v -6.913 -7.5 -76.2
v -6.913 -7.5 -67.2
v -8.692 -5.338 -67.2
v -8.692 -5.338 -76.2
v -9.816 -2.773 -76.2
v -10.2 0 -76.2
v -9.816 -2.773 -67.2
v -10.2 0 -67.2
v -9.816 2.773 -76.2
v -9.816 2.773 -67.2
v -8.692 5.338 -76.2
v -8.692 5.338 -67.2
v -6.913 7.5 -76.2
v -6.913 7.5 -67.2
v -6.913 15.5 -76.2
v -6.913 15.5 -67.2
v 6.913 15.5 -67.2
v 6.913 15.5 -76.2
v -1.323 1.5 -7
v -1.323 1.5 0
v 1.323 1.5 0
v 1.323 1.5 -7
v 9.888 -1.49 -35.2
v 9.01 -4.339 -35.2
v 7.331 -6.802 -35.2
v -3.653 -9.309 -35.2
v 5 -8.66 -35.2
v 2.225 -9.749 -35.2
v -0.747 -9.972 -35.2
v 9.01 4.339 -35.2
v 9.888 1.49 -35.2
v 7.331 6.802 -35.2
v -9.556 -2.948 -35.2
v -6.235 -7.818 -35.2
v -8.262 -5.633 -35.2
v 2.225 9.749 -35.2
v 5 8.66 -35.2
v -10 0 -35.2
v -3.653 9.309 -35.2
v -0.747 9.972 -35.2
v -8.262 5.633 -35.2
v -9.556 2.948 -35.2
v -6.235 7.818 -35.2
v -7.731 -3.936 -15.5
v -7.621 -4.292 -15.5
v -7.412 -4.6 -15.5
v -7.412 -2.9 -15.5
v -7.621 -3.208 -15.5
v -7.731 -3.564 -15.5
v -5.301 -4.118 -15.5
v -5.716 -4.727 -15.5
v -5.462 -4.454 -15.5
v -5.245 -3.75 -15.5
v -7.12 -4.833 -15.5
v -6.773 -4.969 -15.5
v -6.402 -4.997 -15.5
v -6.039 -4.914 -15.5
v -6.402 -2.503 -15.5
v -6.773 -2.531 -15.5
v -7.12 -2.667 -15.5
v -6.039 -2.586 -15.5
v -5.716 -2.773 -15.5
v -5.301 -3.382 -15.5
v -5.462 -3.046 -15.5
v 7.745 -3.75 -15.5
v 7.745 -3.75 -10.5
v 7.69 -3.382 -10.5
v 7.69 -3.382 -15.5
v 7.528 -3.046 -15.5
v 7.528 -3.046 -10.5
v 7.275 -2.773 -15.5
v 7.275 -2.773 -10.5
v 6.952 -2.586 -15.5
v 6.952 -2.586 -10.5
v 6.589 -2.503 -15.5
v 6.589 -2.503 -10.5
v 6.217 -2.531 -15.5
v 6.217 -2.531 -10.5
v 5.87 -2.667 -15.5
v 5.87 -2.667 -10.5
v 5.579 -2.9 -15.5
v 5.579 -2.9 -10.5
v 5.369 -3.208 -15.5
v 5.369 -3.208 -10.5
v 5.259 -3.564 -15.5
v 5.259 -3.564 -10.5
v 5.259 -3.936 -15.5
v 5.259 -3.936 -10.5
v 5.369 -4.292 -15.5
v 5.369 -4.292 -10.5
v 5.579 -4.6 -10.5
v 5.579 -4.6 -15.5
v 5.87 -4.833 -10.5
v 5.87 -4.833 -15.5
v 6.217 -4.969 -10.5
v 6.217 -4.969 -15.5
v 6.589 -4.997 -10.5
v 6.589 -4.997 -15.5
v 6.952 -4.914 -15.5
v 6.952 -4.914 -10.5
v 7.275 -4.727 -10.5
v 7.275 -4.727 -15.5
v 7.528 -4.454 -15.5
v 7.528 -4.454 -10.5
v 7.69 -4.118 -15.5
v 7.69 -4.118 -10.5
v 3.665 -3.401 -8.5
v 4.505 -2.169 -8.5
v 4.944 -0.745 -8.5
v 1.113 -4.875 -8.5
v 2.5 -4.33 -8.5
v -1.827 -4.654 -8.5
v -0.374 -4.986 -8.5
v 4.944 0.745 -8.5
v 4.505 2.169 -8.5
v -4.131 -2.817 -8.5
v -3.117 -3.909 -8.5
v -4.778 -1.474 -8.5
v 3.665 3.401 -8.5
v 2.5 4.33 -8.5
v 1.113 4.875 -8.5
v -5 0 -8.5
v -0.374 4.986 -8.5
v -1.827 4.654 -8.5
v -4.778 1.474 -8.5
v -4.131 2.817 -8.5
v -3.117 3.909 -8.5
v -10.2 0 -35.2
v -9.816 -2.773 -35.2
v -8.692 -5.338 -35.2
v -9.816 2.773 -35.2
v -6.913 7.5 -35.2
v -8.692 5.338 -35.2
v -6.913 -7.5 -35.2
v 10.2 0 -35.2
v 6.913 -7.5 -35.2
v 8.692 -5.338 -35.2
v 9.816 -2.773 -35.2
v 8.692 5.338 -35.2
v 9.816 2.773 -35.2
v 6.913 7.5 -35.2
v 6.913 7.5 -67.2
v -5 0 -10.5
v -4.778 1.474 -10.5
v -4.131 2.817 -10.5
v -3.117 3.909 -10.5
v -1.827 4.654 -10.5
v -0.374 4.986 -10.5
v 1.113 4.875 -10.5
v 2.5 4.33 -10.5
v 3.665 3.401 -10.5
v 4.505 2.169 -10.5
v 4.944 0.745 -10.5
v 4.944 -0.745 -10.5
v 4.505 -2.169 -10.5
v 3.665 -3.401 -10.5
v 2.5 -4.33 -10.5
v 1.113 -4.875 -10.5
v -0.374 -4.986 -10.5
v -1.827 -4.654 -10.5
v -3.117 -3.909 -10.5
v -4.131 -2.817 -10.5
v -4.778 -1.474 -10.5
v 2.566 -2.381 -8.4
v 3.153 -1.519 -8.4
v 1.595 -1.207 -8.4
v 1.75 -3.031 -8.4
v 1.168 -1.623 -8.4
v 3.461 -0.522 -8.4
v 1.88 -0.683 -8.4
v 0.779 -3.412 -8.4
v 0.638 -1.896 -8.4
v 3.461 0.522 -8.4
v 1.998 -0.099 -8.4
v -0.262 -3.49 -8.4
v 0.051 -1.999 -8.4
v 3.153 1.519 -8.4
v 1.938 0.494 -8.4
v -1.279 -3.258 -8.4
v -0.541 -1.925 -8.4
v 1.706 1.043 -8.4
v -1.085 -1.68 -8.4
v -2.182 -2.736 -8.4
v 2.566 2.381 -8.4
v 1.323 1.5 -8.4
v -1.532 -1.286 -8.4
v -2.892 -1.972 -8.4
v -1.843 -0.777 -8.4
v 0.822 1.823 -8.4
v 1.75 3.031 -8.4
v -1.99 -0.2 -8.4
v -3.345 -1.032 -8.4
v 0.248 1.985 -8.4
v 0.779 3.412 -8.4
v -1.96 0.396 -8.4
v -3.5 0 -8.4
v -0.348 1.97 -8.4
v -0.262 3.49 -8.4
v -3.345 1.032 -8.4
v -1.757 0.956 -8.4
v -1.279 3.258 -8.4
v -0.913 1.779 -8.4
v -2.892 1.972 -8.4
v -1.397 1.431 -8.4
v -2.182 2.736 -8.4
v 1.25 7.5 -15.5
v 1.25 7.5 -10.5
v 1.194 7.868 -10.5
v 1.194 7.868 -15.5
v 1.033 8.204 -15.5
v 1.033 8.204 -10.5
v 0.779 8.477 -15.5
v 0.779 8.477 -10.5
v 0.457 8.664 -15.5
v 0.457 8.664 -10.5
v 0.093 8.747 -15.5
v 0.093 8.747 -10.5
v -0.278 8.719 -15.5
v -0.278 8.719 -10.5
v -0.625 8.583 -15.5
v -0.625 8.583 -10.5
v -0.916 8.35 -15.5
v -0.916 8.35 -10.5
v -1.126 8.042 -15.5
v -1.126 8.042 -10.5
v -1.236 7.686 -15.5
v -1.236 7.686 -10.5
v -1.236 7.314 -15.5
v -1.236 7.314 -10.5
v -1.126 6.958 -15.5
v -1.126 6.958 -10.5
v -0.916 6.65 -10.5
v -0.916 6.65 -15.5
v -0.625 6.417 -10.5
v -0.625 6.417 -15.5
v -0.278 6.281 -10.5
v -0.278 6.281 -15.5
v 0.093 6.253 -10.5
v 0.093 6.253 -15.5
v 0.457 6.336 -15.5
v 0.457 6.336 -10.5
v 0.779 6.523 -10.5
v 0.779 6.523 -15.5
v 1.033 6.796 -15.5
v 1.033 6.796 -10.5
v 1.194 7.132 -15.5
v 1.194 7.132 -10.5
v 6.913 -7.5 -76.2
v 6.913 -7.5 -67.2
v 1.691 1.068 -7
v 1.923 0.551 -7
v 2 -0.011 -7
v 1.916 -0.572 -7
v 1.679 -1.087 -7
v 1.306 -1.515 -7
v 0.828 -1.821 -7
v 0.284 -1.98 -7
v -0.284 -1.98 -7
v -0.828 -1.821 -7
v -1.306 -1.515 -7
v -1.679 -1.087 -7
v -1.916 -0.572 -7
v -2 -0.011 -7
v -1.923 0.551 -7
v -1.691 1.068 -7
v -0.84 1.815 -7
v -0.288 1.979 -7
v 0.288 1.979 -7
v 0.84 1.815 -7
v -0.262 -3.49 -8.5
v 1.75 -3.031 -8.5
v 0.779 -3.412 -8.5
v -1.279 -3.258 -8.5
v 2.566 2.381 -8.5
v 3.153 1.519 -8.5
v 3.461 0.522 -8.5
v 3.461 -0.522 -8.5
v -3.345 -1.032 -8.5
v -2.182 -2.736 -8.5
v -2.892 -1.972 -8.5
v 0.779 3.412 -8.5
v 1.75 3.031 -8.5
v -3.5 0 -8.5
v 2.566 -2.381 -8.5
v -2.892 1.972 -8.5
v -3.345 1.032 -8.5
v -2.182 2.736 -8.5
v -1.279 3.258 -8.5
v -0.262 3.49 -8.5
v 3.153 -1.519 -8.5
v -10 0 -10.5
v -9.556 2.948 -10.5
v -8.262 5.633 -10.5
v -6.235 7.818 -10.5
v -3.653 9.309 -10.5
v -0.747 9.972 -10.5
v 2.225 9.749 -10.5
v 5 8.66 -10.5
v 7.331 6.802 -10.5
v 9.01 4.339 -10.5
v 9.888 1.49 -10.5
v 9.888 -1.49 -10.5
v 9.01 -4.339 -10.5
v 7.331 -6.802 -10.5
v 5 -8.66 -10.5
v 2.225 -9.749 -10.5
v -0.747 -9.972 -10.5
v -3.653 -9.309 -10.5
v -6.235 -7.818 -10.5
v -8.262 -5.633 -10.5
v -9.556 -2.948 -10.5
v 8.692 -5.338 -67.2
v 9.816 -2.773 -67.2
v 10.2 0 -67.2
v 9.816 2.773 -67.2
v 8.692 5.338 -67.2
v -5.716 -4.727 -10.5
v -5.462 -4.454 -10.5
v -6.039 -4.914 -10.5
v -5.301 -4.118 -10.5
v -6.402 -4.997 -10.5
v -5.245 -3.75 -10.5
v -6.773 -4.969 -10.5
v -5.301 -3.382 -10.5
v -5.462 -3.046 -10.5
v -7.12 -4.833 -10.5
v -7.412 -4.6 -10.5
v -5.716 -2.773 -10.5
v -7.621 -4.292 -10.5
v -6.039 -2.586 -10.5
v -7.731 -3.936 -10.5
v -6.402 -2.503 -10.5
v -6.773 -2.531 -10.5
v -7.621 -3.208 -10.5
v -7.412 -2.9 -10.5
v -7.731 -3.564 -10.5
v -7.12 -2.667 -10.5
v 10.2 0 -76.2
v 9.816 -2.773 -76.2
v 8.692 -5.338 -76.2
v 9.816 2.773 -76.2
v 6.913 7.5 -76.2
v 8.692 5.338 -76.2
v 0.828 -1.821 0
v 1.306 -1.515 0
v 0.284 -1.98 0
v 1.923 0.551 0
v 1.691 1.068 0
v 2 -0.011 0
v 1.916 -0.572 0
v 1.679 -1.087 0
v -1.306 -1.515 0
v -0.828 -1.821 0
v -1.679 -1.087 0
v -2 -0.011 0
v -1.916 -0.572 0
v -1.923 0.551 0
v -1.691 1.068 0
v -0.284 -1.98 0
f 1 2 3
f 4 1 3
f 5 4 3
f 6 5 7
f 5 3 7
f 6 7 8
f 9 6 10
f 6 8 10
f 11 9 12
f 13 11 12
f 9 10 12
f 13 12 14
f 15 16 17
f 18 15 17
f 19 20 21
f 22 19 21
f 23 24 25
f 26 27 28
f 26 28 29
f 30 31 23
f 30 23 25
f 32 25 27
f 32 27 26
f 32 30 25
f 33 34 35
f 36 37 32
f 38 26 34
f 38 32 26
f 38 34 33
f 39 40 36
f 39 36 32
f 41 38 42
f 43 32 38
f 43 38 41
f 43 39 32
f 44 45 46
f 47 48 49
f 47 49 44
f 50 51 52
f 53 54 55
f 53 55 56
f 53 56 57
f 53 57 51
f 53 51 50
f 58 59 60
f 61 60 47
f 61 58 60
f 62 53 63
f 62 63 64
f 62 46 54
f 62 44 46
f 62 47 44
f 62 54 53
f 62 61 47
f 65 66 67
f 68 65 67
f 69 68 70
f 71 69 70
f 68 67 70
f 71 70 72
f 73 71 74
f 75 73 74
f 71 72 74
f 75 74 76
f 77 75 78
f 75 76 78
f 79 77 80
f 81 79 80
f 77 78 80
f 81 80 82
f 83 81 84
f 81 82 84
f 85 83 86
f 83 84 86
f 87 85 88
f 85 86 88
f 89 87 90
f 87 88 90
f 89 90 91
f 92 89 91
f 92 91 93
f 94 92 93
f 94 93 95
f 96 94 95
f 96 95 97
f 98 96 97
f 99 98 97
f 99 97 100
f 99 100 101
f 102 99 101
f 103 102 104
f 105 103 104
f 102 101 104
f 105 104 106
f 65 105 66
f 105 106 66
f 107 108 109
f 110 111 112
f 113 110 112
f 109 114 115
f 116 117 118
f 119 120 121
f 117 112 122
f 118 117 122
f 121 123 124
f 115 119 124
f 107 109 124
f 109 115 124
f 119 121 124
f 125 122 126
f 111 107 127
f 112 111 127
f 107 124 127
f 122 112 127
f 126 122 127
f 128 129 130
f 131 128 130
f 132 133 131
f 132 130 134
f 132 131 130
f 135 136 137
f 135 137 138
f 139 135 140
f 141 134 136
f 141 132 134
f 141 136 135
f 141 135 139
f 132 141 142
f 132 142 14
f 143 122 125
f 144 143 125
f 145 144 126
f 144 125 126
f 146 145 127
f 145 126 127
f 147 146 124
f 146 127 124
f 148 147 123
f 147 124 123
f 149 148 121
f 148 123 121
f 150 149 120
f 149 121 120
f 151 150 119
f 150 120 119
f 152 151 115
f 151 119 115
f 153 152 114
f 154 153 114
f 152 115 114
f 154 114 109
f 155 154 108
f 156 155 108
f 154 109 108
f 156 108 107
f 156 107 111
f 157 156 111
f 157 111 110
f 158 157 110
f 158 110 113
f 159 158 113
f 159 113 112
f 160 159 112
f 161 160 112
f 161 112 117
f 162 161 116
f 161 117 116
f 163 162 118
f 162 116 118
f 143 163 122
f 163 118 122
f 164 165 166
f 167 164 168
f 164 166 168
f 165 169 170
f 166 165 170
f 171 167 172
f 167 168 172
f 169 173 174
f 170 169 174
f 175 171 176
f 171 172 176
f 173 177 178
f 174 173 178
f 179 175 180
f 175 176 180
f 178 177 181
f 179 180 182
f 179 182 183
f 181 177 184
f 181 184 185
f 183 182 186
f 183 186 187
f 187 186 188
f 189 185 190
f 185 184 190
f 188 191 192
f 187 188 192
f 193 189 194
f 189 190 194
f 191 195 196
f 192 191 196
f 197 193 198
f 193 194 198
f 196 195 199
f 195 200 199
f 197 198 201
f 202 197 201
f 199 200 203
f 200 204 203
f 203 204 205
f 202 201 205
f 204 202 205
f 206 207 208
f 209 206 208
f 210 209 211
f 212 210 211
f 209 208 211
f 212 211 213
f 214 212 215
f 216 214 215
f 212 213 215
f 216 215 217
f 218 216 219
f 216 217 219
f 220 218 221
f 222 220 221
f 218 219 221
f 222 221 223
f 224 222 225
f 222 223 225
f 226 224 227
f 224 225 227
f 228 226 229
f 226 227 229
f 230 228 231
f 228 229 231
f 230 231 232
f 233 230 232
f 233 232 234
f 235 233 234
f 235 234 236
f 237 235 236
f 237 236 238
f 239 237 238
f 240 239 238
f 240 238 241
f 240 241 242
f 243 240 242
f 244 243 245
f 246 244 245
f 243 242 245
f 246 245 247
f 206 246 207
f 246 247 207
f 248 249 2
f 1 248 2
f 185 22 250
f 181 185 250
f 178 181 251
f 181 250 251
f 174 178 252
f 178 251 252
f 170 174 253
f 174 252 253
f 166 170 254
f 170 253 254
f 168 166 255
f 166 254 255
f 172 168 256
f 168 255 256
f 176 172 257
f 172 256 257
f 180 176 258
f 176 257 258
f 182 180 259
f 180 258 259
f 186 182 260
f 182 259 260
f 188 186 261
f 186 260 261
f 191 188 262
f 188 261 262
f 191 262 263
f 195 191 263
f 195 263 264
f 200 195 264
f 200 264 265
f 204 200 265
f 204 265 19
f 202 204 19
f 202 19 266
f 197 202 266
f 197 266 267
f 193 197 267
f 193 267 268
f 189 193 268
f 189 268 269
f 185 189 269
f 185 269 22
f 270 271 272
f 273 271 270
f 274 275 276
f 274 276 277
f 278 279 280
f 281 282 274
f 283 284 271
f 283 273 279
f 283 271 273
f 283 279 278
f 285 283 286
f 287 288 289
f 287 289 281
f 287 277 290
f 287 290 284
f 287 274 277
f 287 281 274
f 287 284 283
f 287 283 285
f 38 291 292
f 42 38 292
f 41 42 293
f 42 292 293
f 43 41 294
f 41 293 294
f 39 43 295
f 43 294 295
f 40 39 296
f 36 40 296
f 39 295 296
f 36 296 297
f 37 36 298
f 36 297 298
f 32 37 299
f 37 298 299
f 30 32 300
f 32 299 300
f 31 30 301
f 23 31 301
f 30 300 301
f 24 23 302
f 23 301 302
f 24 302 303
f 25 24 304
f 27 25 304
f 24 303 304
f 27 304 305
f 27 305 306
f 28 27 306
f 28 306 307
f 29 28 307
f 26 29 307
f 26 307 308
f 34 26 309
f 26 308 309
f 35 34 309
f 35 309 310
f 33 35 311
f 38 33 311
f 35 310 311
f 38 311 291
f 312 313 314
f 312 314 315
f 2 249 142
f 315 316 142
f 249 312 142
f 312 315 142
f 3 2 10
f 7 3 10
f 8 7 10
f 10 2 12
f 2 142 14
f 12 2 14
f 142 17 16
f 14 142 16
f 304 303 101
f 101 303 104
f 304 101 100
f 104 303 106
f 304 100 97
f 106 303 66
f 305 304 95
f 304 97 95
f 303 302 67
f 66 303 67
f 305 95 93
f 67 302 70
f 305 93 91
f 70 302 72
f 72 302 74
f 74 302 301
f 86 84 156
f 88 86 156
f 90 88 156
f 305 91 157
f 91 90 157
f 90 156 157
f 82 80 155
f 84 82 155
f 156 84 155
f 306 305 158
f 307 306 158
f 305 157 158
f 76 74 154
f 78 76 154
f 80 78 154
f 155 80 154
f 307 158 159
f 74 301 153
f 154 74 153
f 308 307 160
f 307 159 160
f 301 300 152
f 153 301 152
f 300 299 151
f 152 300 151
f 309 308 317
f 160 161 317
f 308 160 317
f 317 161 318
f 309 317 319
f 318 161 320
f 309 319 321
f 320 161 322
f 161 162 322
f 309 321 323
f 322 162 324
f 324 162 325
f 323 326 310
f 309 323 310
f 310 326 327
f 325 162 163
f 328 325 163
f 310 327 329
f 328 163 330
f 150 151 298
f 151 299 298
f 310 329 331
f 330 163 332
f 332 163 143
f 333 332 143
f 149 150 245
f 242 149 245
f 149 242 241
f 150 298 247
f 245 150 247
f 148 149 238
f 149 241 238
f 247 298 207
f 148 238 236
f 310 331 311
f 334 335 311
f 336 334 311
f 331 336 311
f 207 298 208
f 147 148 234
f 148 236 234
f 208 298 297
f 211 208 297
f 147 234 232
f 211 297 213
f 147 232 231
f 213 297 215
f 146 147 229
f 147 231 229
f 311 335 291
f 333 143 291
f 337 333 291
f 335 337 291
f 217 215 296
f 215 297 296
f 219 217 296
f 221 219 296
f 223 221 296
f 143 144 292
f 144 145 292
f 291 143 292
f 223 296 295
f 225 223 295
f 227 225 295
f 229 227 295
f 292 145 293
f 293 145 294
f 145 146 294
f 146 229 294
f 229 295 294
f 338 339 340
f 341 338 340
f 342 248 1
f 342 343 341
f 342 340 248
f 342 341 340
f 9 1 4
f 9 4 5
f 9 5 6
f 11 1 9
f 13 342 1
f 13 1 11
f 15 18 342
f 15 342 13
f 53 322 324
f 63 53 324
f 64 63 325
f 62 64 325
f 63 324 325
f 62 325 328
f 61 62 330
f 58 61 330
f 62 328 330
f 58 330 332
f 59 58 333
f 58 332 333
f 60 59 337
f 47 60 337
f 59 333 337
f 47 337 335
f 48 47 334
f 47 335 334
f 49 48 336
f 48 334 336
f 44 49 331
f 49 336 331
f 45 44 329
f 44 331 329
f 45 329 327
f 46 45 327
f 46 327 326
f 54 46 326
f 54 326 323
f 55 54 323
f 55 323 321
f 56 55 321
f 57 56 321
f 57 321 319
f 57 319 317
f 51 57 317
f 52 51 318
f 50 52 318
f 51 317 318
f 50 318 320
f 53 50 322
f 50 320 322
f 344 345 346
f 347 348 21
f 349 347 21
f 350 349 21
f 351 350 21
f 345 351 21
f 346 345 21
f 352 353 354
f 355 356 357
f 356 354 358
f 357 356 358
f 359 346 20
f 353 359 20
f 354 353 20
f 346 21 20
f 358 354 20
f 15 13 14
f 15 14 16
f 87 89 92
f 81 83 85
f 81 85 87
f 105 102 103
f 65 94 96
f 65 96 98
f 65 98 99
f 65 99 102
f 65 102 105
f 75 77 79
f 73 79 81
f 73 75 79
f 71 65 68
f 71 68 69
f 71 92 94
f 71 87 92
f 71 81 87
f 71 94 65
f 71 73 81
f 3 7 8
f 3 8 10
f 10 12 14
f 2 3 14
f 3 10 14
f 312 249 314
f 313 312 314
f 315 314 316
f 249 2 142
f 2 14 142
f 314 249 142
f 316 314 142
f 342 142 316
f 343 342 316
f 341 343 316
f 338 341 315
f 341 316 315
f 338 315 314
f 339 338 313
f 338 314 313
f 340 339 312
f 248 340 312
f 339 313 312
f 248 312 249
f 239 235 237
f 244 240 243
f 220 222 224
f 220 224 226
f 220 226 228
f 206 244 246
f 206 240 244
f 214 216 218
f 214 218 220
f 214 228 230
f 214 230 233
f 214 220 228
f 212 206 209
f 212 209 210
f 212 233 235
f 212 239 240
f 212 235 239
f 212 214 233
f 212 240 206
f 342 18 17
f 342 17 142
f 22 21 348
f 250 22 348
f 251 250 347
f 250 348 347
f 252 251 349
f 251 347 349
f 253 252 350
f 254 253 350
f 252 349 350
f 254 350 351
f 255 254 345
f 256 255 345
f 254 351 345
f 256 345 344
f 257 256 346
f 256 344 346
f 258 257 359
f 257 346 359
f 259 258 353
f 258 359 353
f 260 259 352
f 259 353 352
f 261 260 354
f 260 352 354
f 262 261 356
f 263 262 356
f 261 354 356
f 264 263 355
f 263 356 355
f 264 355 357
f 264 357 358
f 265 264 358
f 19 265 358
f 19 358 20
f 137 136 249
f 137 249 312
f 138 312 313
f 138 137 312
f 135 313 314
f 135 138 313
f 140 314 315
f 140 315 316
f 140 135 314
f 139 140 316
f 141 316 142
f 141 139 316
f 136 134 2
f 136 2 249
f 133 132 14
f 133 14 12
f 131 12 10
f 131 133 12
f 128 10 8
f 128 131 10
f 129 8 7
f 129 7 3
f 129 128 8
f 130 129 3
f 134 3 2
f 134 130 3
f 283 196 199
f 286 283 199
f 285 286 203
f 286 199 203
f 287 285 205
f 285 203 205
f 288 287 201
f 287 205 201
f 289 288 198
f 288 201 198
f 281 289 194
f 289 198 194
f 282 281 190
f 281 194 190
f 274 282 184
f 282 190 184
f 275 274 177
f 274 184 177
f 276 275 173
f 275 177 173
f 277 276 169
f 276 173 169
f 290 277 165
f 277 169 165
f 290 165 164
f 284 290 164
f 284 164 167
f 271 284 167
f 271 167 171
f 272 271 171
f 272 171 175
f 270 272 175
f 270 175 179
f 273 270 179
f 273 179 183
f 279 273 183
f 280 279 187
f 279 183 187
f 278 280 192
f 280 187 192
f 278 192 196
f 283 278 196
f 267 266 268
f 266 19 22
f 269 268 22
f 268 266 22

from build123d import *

# Parameters (mm, degrees)
BOSS_EXTRUDE1_DEPTH = 7
SKETCH2_R           = 2
BOSS_EXTRUDE2_DEPTH = 1.4
SKETCH3_R           = 3.5
BOSS_EXTRUDE3_DEPTH = 0.1
SKETCH4_R           = 5
BOSS_EXTRUDE4_DEPTH = 2
SKETCH5_R           = 10
BOSS_EXTRUDE5_DEPTH = 24.7
SKETCH6_R           = 1.25
SCREW_HOLES_DEPTH   = 5
MOTOR_DEPTH         = 32
ENCODER_DEPTH       = 9


with BuildPart() as part:
    # Sketch1 → Boss-Extrude1 (new body)
    with BuildSketch(Plane.XY):
        with BuildLine():
            Line((-1.322875656, 1.5), (1.322875656, 1.5))
            ThreePointArc((1.322875656, 1.5), (0, -2), (-1.322875656, 1.5))
        make_face()
    extrude(amount=-BOSS_EXTRUDE1_DEPTH)

    # Sketch2 → Boss-Extrude2 (add)
    with BuildSketch(Plane(origin=(0, 0, -7), x_dir=(-1, 0, 0), z_dir=(0, 0, -1))):
        with Locations(Location((0, 0, 0), (0, 0, 131.409622109))):
            Circle(SKETCH2_R)
    extrude(amount=BOSS_EXTRUDE2_DEPTH)

    # Sketch3 → Boss-Extrude3 (add)
    with BuildSketch(Plane(origin=(0, 0, -8.4), x_dir=(-1, 0, 0), z_dir=(0, 0, -1))):
        Circle(SKETCH3_R)
    extrude(amount=BOSS_EXTRUDE3_DEPTH)


with BuildPart() as body_2:
    # Sketch4 → Boss-Extrude4 (new body)
    with BuildSketch(Plane(origin=(0, 0, -8.5), x_dir=(-1, 0, 0), z_dir=(0, 0, -1))):
        Circle(SKETCH4_R)
    extrude(amount=BOSS_EXTRUDE4_DEPTH)

    # Sketch5 → Boss-Extrude5 (add)
    with BuildSketch(Plane(origin=(0, 0, -10.5), x_dir=(-1, 0, 0), z_dir=(0, 0, -1))):
        Circle(SKETCH5_R)
    extrude(amount=BOSS_EXTRUDE5_DEPTH)

    # Sketch6 → Screw Holes (cut)
    with BuildSketch(Plane.XY.offset(-10.5)):
        with Locations((0, 7.5)):
            Circle(SKETCH6_R)
        with Locations((6.495190528, -3.75)):
            Circle(SKETCH6_R)
        with Locations((-6.495190528, -3.75)):
            Circle(SKETCH6_R)
    extrude(amount=-SCREW_HOLES_DEPTH, mode=Mode.SUBTRACT)


with BuildPart() as body_3:
    # Sketch10 → Motor (new body)
    with BuildSketch(Plane(origin=(0, 0, -35.2), x_dir=(-1, 0, 0), z_dir=(0, 0, -1))):
        with BuildLine():
            Line((-6.913031173, 7.5), (6.913031173, 7.5))
            ThreePointArc((6.913031173, 7.5), (10.2, 0), (6.913031173, -7.5))
            Line((6.913031173, -7.5), (-6.913031173, -7.5))
            ThreePointArc((-6.913031173, -7.5), (-10.2, 0), (-6.913031173, 7.5))
        make_face()
    extrude(amount=MOTOR_DEPTH)


with BuildPart() as body_4:
    # Sketch11 → Encoder (new body)
    with BuildSketch(Plane(origin=(0, 0, -67.2), x_dir=(-1, 0, 0), z_dir=(0, 0, -1))):
        with BuildLine():
            Line((-6.913031173, -7.5), (6.913031173, -7.5))
            ThreePointArc((6.913031173, -7.5), (10.2, 0), (6.913031173, 7.5))
            Line((6.913031173, 7.5), (6.913031173, 15.5))
            Line((6.913031173, 15.5), (-6.913031173, 15.5))
            Line((-6.913031173, 15.5), (-6.913031173, 7.5))
            ThreePointArc((-6.913031173, 7.5), (-10.2, 0), (-6.913031173, -7.5))
        make_face()
    extrude(amount=ENCODER_DEPTH)


solid = Compound([part.part, body_2.part, body_3.part, body_4.part])
